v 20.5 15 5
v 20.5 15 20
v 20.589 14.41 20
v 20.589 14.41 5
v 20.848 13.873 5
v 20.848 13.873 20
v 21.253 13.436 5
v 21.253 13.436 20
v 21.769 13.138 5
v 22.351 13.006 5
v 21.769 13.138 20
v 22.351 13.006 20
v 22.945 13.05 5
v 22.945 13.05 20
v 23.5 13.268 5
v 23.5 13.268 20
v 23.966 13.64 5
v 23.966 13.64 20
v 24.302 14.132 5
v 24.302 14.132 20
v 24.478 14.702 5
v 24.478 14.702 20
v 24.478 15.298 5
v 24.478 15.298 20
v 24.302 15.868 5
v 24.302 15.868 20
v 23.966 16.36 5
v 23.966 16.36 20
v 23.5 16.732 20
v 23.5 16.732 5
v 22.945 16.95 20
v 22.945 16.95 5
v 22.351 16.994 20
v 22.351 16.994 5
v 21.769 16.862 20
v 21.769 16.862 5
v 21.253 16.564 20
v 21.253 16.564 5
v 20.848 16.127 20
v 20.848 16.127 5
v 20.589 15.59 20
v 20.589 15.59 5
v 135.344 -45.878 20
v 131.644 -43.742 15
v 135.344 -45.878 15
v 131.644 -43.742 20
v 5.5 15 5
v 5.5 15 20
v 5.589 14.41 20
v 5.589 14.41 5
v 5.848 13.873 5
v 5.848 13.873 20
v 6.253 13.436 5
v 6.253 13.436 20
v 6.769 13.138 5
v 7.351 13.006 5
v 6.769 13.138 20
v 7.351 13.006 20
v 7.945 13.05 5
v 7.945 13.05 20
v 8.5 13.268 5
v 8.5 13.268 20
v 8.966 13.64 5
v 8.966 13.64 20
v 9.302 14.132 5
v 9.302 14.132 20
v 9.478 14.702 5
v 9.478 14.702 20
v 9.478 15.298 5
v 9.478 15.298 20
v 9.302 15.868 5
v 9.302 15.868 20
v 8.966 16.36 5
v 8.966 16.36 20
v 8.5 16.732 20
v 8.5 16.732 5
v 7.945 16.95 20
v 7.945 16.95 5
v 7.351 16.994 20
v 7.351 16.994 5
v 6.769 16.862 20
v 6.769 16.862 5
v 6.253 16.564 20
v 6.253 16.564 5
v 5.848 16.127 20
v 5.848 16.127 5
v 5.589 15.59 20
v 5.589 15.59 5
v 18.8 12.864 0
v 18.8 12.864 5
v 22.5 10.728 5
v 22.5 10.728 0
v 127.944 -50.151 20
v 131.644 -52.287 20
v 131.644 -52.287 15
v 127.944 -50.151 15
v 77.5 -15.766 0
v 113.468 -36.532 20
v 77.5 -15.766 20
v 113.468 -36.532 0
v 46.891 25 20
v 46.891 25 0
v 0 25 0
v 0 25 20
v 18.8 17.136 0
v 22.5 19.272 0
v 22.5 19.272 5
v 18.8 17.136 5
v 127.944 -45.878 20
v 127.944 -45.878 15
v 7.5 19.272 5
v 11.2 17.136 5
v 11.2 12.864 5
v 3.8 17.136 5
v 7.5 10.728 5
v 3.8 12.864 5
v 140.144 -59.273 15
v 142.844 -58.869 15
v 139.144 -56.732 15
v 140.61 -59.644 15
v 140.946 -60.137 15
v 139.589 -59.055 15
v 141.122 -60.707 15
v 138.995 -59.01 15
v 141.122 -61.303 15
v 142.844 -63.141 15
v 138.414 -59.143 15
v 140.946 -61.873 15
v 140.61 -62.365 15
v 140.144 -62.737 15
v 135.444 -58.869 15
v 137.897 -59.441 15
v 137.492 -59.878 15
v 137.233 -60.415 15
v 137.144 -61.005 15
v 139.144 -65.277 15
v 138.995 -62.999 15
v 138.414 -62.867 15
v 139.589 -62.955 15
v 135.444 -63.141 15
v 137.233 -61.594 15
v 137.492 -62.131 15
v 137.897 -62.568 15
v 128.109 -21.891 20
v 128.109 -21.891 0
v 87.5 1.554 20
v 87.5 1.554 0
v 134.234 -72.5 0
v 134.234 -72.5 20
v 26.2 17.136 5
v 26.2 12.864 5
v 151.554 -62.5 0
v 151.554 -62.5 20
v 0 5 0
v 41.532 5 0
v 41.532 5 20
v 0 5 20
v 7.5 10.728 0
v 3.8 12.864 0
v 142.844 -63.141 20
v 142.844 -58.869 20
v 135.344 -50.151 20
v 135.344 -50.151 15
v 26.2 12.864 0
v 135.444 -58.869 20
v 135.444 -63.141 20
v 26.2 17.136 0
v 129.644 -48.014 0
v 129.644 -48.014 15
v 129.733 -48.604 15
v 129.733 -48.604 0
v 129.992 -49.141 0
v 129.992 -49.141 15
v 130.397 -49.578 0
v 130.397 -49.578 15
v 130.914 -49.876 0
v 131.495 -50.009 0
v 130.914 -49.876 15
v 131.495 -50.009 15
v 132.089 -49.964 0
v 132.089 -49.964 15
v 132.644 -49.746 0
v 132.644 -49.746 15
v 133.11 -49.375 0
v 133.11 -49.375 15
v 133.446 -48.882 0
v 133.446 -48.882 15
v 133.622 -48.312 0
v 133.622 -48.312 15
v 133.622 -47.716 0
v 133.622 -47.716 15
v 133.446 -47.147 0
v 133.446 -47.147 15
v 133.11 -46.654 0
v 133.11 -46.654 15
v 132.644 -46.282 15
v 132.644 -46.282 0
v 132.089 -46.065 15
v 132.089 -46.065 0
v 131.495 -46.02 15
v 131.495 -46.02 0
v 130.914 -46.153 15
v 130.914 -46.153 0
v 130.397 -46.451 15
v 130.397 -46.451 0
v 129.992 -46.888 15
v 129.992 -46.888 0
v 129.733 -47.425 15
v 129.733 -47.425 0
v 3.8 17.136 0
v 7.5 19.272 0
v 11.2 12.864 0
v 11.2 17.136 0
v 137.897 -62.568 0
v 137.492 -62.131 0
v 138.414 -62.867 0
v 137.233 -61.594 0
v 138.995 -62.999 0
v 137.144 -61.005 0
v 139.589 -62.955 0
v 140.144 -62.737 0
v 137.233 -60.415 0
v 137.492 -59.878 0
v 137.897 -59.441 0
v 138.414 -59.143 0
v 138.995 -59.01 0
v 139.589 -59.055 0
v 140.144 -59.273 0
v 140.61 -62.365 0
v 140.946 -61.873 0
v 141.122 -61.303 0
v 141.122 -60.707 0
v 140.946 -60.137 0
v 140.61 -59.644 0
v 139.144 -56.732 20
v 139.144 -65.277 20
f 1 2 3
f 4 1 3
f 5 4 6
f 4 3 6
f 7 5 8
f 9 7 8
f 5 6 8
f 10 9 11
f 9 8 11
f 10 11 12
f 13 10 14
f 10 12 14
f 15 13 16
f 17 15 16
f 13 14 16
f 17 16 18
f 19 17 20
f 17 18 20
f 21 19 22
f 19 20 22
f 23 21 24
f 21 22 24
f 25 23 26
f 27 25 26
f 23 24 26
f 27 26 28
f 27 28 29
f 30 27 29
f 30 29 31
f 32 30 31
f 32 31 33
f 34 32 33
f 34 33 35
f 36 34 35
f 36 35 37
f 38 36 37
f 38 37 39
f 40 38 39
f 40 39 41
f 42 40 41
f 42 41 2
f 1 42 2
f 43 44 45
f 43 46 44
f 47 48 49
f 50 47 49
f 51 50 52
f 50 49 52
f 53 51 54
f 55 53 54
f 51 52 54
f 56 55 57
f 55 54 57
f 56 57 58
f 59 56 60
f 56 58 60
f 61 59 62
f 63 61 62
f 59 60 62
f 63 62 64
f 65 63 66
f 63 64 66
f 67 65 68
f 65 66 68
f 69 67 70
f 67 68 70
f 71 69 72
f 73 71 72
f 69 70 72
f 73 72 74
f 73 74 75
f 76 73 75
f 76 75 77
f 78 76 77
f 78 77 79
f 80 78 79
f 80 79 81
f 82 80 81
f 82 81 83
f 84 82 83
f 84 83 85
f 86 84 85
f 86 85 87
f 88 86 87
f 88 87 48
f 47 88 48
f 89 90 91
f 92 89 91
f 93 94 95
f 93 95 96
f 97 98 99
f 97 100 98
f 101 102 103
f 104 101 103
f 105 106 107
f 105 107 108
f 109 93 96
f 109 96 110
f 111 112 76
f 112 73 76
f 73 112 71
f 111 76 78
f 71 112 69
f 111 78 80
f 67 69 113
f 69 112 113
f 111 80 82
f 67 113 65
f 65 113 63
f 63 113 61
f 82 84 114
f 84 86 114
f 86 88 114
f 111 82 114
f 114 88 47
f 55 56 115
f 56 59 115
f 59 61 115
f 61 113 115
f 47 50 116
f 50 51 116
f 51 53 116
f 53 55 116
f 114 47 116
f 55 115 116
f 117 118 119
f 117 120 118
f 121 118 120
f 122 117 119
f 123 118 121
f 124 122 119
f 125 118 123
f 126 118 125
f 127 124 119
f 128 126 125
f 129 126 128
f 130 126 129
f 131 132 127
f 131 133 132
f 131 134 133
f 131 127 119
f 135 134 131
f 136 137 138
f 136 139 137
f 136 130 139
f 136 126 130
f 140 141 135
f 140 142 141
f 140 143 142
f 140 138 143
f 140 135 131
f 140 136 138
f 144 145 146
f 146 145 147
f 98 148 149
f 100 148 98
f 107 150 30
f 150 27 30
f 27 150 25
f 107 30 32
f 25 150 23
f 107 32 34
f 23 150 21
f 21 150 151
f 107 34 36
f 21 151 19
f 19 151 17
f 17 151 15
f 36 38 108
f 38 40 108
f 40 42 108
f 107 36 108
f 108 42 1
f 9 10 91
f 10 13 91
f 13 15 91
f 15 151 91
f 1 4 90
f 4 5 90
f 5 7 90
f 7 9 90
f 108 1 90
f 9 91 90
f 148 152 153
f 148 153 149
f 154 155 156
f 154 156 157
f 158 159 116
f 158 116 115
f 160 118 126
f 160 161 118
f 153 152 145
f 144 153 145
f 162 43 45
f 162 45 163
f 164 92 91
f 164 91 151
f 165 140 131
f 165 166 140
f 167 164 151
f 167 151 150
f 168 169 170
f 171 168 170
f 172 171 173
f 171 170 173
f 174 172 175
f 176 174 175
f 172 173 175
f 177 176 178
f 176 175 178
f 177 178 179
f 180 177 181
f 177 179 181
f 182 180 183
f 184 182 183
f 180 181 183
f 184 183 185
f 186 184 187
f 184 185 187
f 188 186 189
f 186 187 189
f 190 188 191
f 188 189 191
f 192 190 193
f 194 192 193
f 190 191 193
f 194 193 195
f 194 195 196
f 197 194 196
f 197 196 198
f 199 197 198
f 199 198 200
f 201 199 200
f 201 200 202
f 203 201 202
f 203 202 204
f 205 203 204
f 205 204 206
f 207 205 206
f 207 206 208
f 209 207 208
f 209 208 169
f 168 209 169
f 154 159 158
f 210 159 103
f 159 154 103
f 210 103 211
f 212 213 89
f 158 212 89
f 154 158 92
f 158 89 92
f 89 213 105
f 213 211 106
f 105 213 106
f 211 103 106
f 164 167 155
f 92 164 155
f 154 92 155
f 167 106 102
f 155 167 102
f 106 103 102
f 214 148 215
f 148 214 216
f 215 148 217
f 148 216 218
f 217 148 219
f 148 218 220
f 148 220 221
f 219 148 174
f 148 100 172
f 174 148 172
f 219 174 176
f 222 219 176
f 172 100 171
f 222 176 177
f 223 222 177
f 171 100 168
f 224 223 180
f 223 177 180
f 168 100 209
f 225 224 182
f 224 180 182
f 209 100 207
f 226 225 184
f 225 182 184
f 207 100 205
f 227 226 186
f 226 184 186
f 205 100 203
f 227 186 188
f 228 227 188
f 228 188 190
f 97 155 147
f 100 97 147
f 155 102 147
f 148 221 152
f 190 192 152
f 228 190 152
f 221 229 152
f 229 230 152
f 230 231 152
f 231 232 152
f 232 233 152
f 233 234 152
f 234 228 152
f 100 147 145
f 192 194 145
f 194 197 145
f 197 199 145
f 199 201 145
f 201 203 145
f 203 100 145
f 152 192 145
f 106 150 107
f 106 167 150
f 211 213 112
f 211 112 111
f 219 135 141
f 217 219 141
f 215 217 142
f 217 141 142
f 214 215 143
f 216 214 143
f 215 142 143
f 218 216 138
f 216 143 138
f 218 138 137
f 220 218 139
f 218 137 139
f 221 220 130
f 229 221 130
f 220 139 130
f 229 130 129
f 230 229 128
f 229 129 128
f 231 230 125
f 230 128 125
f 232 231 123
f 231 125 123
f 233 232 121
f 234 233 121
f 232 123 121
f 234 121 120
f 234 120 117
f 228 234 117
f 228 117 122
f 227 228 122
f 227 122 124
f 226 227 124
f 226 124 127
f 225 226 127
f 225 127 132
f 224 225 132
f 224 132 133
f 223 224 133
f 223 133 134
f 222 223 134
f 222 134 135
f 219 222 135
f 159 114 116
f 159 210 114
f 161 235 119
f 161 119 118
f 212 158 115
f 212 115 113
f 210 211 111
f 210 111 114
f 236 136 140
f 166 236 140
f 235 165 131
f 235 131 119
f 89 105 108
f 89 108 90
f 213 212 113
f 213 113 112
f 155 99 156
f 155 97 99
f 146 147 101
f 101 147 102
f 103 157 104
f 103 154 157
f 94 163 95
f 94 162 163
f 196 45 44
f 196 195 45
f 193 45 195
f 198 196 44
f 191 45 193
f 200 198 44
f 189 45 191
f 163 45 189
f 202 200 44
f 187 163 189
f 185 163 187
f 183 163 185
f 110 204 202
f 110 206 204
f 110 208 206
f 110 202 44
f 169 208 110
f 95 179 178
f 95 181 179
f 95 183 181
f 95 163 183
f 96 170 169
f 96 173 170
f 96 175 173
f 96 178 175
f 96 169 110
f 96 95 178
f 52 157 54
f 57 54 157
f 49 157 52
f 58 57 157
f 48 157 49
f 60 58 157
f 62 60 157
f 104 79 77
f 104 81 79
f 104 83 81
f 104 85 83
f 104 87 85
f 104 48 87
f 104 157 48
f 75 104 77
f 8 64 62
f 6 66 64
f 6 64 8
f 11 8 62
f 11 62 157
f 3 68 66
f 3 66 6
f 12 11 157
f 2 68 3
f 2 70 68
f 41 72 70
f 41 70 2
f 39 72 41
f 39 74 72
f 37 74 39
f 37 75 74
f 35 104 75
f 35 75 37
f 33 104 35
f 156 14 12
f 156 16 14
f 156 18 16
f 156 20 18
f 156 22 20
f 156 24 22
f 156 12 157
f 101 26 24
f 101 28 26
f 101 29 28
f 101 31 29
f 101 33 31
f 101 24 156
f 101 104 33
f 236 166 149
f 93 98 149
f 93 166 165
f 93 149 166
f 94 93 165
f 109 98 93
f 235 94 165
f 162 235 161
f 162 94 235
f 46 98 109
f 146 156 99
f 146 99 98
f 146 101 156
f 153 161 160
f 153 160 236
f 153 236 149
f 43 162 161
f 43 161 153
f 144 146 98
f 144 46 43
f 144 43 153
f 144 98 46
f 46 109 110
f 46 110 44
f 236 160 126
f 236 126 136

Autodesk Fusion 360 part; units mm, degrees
sketch "Sketch1" plane through (0, 0, 0) normal (0, 0, 1) x (1, 0, 0)
  line L0 (151.5544, -62.5) -> (128.1089, -21.8911)
  line L1 (128.1089, -21.8911) -> (46.8911, 25)
  line L2 (46.8911, 25) -> (0, 25)
  line L3 (0, 0) -> (0, 25)
  arc A0 (129.9038, -75) -> (0, 0) centre (0, -150) ccw
  line L4 (151.5544, -62.5) -> (129.9038, -75)
  line L5 (113.4679, -36.5321) -> (41.5321, 5)
  line L6 (41.5321, 5) -> (0, 5)
  line L7 (134.2339, -72.5) -> (113.4679, -36.5321)
  line L8 (77.5, -15.7661) -> (87.5, 1.5544)
  point P0 (0, -150)
  point P1 (0, -150)
  dimension "d1" = 300
  dimension "d4" = 150
  dimension "d5" = 150
  dimension "d14" = 25
  dimension "d15" = 25
  dimension "d16" = 60
  dimension "d17" = 175
  dimension "d30" = 20
  dimension "d31" = 20
  dimension "d32" = 20
extrude "Extrude1" add sketch "Sketch1" along normal blind 20 contours L1 L2 L3 L5 L6 L8
mirror "Mirror2" about plane through (77.5, -15.7661, 0) normal (-0.866, 0.5, 0) of bodies 1 merged
sketch "Sketch4" plane through (0, 0, 20) normal (0, 0, 1) x (-1, 0, 0)
  line L0 (-128.1089, 21.8911) -> (-46.8911, -25)
  line L1 (-46.8911, -25) -> (0, -25)
  line L2 (-41.5321, -5) -> (-41.5321, -25) construction
  line L3 (-41.5321, -15) -> (0, -15) construction
  circle A0 centre (-7.5, -15) radius 2
  circle A1 centre (-22.5, -15) radius 2
  line L4 (-3.8, -17.1362) -> (-3.8, -12.8638)
  line L5 (-3.8, -12.8638) -> (-7.5, -10.7276)
  line L6 (-7.5, -10.7276) -> (-11.2, -12.8638)
  line L7 (-11.2, -12.8638) -> (-11.2, -17.1362)
  line L8 (-11.2, -17.1362) -> (-7.5, -19.2724)
  line L9 (-7.5, -19.2724) -> (-3.8, -17.1362)
  line L10 (-18.8, -17.1362) -> (-18.8, -12.8638)
  line L11 (-18.8, -12.8638) -> (-22.5, -10.7276)
  line L12 (-22.5, -10.7276) -> (-26.2, -12.8638)
  line L13 (-26.2, -12.8638) -> (-26.2, -17.1362)
  line L14 (-26.2, -17.1362) -> (-22.5, -19.2724)
  line L15 (-22.5, -19.2724) -> (-18.8, -17.1362)
  line L16 (0, -5) -> (-41.5321, -5)
  line L17 (-41.5321, -5) -> (-113.4679, 36.5321)
  line L18 (0, -25) -> (0, -5)
  line L19 (-113.4679, 36.5321) -> (-134.2339, 72.5)
  line L20 (-134.2339, 72.5) -> (-151.5544, 62.5)
  line L21 (-151.5544, 62.5) -> (-128.1089, 21.8911)
  line L22 (-77.5, 15.7661) -> (-87.5, -1.5544) construction
  line L23 (-142.8442, 58.8686) -> (-142.8442, 63.141)
  line L24 (-139.1442, 56.7324) -> (-142.8442, 58.8686)
  line L25 (-135.4442, 58.8686) -> (-139.1442, 56.7324)
  line L26 (-135.4442, 63.141) -> (-135.4442, 58.8686)
  line L27 (-139.1442, 65.2772) -> (-135.4442, 63.141)
  line L28 (-142.8442, 63.141) -> (-139.1442, 65.2772)
  line L29 (-131.6442, 52.2868) -> (-127.9442, 50.1506)
  line L30 (-135.3442, 50.1506) -> (-131.6442, 52.2868)
  line L31 (-135.3442, 45.8782) -> (-135.3442, 50.1506)
  line L32 (-131.6442, 43.742) -> (-135.3442, 45.8782)
  line L33 (-127.9442, 45.8782) -> (-131.6442, 43.742)
  line L34 (-127.9442, 50.1506) -> (-127.9442, 45.8782)
  circle A2 centre (-139.1442, 61.0048) radius 2
  circle A3 centre (-131.6442, 48.0144) radius 2
  point P0 (-7.5, -15)
  point P1 (-22.5, -15)
  dimension "d18" = 4
  dimension "d19" = 7.5
  dimension "d20" = 15
  dimension "d21" = 7.4
extrude "Extrude4" cut sketch "Sketch4" against normal through all contours A0 | A1 | A2 | A3
extrude "Extrude5" cut sketch "Sketch4" along normal blind 5 from surface at -20 contours L4 L5 L6 L7 L8 L9 | L10 L11 L12 L13 L14 L15
extrude "Extrude6" cut sketch "Sketch4" against normal blind 5 contours L23 L24 L25 L26 L27 L28 | L29 L30 L31 L32 L33 L34
equation "d21 = 7 mm + 2 * gap"
equation "gap = 0.2 mm"
